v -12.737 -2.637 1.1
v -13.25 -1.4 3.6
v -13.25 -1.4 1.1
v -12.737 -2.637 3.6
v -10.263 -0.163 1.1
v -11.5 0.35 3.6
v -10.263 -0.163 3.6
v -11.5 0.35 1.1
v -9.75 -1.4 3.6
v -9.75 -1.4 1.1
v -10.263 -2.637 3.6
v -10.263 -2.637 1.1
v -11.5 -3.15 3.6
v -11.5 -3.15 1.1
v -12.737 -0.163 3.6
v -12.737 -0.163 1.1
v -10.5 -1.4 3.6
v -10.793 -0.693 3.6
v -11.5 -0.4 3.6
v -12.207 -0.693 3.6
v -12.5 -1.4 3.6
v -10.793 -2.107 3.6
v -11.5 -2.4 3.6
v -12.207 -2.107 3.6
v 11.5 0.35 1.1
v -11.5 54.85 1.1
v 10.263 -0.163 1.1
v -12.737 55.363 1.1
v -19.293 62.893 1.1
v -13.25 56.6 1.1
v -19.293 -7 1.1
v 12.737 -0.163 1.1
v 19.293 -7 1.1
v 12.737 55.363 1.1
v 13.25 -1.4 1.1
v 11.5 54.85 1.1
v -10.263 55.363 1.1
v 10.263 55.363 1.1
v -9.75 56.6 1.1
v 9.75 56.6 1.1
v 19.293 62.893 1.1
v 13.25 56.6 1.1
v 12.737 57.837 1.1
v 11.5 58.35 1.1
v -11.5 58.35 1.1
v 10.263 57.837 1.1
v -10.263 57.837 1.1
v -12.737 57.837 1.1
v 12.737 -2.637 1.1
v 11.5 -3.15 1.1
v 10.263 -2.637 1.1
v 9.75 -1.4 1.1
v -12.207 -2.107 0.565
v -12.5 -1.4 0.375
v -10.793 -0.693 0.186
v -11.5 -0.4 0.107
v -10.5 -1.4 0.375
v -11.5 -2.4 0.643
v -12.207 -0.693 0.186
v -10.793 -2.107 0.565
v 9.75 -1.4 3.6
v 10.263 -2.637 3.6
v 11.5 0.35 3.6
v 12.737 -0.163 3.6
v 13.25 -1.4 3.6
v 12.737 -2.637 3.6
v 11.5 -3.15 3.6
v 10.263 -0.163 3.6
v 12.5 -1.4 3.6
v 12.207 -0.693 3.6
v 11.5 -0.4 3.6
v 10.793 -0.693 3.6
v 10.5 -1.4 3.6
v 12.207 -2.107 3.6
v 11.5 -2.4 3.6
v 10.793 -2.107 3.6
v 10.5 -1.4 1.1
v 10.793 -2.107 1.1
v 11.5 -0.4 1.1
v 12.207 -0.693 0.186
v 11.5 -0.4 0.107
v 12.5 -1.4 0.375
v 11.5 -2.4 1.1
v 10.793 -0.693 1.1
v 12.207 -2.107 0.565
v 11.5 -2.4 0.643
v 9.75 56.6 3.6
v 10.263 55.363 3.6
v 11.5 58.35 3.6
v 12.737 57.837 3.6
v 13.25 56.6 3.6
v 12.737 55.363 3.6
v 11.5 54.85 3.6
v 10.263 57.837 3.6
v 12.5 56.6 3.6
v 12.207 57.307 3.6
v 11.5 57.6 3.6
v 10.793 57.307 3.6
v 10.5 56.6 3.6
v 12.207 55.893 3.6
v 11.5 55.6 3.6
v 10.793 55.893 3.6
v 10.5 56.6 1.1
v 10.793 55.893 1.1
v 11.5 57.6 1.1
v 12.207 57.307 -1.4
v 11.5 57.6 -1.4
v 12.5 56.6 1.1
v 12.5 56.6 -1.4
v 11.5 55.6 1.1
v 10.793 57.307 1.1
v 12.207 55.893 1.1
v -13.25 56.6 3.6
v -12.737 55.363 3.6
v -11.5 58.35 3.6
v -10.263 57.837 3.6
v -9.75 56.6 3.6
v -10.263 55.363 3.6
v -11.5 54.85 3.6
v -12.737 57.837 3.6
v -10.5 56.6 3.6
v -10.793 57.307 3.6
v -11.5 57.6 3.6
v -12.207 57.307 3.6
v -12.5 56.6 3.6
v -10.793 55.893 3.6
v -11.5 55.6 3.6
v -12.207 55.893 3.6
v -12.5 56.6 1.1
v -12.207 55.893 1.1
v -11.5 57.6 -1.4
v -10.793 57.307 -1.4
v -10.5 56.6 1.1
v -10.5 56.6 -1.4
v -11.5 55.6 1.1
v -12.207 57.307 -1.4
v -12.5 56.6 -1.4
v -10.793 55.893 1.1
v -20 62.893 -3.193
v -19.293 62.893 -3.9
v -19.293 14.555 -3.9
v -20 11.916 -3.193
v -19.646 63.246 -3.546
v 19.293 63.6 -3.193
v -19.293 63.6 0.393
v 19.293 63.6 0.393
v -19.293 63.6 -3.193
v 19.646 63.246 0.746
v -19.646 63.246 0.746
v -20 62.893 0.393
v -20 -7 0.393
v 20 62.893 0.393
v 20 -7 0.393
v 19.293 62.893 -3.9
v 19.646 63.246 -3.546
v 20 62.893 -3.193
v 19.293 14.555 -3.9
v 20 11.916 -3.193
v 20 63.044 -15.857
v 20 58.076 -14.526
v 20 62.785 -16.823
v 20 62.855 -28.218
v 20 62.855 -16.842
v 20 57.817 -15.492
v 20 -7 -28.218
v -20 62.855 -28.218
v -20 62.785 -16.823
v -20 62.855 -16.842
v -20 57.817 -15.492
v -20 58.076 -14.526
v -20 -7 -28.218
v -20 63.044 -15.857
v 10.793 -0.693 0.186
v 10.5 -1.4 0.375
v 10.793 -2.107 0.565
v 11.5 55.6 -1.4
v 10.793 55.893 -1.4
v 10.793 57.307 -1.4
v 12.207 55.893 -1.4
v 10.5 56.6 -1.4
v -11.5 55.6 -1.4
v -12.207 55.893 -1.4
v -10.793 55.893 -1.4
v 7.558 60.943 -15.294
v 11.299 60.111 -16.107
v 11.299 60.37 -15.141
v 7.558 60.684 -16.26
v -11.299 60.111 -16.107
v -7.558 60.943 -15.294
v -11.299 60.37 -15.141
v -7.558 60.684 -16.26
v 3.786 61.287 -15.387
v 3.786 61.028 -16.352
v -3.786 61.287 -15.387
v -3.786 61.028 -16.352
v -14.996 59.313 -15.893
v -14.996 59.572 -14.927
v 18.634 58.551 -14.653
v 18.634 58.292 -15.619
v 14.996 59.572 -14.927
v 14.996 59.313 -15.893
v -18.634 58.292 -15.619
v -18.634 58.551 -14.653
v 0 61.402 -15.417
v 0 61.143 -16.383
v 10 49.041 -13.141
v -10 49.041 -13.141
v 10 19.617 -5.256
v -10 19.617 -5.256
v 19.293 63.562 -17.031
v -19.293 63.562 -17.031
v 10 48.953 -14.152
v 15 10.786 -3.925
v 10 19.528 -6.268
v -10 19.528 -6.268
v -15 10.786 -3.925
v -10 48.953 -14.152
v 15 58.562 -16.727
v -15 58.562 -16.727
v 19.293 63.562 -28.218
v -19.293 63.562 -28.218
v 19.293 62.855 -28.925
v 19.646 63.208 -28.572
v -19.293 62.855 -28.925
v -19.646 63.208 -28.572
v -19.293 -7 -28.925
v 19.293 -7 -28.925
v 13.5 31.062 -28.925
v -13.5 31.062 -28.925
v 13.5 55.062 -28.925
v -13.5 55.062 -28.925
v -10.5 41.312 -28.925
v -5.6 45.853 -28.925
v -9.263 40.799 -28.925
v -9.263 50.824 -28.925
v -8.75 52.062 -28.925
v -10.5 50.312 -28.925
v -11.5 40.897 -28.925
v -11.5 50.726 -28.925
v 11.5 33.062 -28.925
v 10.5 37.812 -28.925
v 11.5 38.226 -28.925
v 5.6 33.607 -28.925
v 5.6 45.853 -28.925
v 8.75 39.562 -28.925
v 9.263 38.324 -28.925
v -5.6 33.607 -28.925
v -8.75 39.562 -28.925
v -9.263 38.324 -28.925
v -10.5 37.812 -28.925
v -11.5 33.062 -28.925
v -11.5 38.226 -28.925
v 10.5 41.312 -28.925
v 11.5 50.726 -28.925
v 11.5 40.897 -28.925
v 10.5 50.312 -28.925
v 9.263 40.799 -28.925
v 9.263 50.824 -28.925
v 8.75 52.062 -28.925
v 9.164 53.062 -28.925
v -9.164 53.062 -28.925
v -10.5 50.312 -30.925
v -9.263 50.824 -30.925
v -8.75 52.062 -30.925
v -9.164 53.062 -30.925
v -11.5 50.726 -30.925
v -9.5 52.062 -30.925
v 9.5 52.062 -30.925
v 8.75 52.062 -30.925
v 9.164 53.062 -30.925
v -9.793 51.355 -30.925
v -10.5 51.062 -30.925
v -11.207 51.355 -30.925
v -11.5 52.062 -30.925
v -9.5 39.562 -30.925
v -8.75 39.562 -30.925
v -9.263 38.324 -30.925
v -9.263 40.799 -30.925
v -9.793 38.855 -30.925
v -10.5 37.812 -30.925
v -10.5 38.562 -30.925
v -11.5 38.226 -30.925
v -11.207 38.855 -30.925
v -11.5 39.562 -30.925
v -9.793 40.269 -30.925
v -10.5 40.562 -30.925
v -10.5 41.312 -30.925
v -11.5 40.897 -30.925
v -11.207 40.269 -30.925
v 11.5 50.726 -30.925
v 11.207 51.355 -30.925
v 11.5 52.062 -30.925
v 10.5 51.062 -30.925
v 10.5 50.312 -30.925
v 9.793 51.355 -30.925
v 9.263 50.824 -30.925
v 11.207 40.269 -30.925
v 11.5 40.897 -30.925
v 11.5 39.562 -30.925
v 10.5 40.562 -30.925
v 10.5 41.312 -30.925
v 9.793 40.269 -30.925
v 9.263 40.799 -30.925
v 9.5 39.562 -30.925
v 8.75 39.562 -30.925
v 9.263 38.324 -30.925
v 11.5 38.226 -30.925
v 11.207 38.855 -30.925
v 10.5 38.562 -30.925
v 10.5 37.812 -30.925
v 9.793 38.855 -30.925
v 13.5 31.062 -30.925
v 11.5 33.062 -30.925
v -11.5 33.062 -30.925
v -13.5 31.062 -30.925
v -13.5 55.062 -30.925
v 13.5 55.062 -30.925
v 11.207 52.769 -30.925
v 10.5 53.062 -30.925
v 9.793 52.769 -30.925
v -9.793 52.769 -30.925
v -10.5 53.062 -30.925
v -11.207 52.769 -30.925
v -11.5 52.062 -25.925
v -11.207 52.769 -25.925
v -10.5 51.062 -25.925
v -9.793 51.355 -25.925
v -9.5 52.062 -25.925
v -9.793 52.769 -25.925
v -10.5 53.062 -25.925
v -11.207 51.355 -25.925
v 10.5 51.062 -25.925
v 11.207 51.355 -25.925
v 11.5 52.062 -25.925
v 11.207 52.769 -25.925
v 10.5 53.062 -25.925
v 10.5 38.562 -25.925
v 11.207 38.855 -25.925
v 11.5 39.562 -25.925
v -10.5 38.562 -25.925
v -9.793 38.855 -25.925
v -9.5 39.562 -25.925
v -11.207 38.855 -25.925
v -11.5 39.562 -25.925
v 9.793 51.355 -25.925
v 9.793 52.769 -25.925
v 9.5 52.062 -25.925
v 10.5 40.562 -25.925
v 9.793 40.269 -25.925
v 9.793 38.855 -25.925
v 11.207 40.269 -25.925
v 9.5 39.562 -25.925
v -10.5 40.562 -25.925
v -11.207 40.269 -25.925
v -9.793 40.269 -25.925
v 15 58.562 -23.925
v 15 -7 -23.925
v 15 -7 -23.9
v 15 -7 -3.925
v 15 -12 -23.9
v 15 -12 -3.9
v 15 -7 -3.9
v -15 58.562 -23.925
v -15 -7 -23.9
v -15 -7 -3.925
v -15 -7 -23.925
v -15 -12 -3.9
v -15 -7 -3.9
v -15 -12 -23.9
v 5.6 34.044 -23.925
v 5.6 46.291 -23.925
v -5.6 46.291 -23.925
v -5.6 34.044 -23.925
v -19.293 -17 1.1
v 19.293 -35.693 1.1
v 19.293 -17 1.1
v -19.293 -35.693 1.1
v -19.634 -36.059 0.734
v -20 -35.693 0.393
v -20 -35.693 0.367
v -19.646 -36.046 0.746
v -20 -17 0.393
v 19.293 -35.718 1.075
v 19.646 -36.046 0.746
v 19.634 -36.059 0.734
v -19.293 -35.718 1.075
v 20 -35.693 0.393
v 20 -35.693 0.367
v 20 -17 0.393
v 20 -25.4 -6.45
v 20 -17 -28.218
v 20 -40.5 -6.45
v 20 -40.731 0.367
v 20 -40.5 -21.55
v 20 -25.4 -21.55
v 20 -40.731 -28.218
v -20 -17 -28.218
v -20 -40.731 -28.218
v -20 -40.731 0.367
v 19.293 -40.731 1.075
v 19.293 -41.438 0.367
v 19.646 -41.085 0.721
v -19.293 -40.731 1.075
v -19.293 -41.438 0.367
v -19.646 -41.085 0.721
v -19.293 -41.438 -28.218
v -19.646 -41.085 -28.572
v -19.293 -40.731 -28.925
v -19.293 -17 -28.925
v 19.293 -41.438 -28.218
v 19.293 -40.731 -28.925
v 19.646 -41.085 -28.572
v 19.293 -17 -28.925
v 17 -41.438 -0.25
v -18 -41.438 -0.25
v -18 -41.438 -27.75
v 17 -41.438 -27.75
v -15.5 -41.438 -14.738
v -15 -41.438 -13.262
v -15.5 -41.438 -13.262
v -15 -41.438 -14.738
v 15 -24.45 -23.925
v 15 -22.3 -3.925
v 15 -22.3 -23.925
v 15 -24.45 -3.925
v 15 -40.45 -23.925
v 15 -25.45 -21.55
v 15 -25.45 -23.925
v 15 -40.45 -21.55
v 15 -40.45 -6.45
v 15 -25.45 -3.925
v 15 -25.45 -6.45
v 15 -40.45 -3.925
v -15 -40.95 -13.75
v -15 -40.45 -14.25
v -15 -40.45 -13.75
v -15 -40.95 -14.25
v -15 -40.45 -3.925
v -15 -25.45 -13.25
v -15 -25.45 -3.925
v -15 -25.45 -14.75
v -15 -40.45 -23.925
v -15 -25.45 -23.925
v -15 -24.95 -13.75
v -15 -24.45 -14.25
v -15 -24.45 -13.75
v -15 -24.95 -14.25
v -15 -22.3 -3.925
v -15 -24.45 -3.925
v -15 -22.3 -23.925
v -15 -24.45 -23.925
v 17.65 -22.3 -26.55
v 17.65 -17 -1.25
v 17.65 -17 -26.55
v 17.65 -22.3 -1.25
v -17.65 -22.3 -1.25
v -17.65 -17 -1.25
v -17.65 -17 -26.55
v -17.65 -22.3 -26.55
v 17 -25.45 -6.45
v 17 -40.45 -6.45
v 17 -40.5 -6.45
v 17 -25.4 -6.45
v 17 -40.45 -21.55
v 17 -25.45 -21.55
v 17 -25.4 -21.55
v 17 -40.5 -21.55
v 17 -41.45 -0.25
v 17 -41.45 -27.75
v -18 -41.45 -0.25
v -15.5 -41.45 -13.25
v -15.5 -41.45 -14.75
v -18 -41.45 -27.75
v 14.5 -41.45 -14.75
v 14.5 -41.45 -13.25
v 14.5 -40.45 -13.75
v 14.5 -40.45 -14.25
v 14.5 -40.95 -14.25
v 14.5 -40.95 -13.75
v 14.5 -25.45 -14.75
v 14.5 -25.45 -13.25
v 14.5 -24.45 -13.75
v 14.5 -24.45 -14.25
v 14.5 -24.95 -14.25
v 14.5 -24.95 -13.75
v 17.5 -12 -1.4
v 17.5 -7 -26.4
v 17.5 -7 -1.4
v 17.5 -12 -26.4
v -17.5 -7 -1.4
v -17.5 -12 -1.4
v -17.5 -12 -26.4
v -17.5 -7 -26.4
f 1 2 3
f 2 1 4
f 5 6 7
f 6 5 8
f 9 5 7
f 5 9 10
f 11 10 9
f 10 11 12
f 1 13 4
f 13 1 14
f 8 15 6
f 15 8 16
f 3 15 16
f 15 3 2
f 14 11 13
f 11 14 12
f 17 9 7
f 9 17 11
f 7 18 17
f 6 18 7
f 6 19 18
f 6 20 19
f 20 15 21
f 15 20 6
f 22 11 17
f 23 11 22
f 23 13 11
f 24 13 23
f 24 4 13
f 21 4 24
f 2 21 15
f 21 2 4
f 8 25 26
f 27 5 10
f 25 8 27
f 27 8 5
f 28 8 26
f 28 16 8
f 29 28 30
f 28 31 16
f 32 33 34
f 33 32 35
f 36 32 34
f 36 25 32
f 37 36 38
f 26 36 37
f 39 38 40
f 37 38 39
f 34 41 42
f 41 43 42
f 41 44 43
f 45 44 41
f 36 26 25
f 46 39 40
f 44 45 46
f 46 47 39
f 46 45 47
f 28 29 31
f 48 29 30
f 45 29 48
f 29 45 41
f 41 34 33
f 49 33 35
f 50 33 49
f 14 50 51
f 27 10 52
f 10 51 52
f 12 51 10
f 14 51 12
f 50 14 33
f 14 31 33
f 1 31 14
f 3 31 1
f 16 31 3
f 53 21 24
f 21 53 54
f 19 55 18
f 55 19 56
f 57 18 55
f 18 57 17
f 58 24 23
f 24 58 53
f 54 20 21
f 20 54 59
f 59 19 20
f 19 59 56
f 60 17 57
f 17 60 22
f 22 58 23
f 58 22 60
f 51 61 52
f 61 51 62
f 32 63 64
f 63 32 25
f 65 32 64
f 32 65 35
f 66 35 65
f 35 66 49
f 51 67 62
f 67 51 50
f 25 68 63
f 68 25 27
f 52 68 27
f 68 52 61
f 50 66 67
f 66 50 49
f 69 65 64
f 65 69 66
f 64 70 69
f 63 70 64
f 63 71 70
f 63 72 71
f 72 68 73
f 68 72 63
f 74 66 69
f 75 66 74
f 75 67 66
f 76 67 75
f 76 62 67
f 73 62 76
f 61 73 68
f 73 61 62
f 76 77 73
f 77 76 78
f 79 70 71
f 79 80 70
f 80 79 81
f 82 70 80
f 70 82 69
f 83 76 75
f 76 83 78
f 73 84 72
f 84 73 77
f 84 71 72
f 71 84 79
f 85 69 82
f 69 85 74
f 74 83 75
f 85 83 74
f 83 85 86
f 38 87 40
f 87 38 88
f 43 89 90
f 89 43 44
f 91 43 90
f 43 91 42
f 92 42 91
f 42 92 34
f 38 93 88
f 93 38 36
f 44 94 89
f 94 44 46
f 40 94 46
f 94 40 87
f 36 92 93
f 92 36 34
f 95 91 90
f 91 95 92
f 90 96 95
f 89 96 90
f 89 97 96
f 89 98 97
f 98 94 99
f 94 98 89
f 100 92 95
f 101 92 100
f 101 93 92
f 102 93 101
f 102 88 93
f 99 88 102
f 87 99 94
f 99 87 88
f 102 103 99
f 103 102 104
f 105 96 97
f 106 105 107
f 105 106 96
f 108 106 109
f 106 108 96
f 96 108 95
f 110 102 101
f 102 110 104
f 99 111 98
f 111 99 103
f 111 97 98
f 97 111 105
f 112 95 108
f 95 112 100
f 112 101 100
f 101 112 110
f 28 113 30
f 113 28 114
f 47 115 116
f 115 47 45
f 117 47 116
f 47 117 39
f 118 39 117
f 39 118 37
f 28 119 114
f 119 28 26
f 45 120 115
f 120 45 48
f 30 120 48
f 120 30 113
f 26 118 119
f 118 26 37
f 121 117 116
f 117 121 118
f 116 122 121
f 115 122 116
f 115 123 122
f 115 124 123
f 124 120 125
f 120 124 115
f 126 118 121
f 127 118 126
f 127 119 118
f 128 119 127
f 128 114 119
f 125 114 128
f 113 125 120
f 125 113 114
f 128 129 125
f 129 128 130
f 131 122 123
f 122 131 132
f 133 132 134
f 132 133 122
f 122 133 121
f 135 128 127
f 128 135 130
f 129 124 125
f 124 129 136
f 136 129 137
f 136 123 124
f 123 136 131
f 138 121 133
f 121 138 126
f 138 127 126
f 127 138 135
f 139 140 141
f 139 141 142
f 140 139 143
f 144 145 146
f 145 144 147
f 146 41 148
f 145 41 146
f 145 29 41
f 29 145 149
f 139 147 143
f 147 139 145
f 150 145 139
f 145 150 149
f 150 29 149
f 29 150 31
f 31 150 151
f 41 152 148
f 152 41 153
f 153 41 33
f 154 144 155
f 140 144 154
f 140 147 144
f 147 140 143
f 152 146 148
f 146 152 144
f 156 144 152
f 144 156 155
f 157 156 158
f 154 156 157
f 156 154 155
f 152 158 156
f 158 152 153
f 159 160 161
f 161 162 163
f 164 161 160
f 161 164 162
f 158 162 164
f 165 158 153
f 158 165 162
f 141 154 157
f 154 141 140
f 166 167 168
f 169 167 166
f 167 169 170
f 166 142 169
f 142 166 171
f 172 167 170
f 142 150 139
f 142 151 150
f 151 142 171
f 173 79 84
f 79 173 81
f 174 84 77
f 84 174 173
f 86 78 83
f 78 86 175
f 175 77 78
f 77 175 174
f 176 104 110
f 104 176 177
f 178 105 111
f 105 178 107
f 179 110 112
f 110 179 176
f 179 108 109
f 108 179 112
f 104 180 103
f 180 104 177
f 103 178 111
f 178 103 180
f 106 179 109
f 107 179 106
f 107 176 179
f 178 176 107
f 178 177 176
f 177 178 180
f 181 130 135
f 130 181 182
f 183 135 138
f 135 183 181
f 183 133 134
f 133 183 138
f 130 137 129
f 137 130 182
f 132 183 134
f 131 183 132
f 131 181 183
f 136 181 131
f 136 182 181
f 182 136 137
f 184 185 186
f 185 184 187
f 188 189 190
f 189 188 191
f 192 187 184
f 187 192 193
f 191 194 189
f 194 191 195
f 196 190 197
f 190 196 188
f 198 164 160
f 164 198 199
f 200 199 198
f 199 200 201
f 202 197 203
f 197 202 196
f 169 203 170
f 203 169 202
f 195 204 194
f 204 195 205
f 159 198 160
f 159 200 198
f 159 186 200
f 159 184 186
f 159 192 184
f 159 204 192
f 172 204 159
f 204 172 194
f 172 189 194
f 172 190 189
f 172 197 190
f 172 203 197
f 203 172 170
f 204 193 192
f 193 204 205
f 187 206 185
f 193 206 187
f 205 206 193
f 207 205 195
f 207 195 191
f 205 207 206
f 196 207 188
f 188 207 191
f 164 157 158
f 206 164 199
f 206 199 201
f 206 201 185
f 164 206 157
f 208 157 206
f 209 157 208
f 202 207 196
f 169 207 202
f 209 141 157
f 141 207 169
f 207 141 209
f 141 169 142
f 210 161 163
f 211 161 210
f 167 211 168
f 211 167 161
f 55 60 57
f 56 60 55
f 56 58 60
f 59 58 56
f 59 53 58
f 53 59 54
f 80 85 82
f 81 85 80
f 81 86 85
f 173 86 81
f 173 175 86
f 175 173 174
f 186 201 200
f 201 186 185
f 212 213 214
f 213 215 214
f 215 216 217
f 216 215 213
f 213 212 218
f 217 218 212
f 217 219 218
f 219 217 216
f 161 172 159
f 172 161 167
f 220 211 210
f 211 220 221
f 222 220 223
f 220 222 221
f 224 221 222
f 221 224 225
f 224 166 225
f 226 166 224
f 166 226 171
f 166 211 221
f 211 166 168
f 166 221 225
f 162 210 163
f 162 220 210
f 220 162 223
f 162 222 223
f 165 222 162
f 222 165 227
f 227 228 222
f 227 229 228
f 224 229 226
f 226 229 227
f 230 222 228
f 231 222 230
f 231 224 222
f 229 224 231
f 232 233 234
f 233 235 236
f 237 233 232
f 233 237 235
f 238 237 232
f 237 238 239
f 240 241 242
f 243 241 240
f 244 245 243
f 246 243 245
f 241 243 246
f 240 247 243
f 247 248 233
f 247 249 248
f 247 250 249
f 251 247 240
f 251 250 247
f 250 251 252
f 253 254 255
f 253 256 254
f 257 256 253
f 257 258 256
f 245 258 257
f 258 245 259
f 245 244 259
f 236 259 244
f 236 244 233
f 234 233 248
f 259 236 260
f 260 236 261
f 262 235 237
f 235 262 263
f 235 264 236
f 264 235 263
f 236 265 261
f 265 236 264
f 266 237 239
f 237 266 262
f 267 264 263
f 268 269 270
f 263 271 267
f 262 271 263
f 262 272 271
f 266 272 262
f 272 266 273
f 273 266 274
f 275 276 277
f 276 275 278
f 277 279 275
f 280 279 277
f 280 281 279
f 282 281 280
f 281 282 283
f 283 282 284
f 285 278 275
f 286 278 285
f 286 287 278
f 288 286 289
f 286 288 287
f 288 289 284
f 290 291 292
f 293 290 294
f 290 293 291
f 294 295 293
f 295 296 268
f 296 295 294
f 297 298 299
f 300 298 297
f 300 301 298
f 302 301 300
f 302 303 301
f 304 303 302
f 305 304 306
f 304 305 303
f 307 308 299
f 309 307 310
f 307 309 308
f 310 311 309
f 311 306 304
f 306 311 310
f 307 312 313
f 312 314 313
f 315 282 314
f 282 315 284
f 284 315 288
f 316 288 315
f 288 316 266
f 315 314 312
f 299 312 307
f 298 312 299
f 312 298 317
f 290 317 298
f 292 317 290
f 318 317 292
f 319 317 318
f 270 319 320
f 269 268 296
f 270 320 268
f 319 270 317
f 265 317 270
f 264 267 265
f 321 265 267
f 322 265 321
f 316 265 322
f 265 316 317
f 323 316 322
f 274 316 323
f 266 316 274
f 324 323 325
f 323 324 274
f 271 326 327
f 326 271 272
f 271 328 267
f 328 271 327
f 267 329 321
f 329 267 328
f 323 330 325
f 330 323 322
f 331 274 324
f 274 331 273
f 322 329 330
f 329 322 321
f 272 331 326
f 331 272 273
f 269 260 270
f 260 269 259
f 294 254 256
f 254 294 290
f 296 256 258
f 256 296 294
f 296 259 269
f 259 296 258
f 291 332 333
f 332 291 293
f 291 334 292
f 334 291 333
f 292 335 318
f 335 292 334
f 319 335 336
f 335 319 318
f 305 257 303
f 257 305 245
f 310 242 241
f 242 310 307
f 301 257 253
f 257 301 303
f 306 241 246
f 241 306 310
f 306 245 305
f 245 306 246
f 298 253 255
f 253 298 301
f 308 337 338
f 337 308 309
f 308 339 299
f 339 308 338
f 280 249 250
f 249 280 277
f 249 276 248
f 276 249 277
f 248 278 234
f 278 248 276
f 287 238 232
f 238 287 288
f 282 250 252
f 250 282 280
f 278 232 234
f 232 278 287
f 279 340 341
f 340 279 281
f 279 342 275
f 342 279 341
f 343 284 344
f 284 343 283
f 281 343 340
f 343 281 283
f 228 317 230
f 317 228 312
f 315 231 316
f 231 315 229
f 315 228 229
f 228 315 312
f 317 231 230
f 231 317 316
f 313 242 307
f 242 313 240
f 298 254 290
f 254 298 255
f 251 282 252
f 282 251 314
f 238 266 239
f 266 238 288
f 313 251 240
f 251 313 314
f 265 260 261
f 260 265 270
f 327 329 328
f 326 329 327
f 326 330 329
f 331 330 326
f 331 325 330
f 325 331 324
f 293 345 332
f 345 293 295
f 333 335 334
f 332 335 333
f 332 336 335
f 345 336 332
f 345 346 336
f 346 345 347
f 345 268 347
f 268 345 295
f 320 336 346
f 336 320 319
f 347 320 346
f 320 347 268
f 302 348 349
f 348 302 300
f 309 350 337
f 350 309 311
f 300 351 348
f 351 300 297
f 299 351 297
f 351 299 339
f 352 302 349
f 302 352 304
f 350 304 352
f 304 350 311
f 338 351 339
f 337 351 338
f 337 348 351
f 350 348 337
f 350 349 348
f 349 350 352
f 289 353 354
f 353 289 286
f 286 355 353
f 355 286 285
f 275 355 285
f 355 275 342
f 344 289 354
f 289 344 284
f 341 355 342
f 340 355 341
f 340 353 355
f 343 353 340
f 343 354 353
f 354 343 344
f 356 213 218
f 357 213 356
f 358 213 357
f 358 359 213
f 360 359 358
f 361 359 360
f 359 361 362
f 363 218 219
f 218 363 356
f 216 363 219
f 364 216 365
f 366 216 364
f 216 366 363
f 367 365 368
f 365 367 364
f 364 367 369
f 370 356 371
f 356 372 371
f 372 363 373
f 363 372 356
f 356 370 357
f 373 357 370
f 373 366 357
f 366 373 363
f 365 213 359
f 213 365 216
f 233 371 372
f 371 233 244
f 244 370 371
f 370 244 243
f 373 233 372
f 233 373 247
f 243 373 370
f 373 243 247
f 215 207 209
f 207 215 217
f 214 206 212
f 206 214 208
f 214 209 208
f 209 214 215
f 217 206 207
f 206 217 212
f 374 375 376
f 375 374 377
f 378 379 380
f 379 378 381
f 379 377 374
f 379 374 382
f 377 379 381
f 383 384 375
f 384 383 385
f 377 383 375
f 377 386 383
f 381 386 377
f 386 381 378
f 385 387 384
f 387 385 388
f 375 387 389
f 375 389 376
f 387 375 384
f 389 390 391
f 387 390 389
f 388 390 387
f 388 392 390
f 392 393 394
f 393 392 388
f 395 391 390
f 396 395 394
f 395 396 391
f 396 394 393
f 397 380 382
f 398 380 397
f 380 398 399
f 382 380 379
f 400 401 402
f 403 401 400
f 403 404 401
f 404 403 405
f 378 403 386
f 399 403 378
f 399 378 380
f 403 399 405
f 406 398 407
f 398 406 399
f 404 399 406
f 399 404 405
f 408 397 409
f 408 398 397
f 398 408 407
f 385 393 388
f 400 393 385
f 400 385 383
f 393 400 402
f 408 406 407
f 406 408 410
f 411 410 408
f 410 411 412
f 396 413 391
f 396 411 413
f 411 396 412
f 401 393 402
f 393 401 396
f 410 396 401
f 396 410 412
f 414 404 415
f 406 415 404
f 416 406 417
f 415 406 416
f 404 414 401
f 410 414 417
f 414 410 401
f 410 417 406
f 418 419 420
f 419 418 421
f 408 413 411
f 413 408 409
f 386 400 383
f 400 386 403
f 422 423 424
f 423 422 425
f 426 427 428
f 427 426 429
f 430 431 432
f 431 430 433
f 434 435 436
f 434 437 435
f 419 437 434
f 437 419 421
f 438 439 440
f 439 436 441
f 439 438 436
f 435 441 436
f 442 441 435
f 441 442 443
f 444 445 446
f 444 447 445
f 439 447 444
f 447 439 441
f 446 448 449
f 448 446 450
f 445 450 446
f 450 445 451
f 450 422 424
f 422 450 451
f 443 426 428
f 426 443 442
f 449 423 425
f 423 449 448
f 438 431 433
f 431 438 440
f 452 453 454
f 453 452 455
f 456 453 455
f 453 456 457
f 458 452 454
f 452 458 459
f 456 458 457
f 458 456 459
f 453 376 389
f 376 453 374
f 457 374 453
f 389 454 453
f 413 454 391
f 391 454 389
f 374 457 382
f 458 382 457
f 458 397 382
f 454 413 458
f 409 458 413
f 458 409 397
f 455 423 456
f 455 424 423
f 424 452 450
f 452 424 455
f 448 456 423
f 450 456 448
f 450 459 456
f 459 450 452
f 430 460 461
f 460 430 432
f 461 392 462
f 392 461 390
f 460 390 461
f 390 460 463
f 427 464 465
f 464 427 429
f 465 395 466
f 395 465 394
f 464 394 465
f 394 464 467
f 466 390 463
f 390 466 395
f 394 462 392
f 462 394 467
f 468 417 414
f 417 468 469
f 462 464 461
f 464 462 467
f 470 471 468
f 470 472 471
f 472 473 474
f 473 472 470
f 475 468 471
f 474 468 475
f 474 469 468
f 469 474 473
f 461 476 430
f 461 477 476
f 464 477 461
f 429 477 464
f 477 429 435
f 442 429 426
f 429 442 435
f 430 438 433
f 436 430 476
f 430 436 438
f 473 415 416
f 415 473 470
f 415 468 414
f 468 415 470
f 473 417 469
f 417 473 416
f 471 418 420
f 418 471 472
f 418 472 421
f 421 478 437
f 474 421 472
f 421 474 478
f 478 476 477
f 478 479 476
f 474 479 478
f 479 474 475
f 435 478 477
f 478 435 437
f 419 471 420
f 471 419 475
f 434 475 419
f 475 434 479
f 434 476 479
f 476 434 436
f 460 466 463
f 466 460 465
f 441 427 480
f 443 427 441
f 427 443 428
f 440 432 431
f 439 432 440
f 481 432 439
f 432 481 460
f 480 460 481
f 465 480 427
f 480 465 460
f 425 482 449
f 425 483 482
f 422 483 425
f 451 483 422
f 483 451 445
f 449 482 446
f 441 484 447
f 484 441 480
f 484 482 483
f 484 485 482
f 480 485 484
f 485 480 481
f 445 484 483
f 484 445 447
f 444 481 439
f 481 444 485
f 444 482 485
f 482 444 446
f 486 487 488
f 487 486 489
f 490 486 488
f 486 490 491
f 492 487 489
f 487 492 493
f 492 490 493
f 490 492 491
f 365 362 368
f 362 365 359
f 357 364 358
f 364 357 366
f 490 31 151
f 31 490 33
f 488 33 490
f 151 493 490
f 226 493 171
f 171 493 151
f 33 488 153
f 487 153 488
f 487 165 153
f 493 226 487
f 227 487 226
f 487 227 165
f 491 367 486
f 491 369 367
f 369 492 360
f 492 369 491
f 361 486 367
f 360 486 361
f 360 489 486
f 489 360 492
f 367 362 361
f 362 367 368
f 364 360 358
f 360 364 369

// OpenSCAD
// file: chamfer.scad
module chamfered_cube(size, chamfer, center = false) {
    center_offset = center ? [
        -size[0]/2,
        -size[1]/2,
        -size[2]/2
    ] : [0,0,0];
    
    translate(center_offset)
    
    difference() {
        cube(size);
        
        chamfer_cross(size, chamfer);
        
        translate([0,size[1],size[2]])
        chamfer_cross(size, chamfer);
        
        translate([size[0],0,size[2]])
        chamfer_cross(size, chamfer);
        
        translate([size[0],size[1], 0])
        chamfer_cross(size, chamfer);
    }
}

module chamfer_cross(size, chamfer){
    for(z=[0:3]) for(y=[0:3])
            rotate([0,90*y,90*z])
            translate([max(size)/2,0,0])
            rotate([45,0,0])
            cube([max(size),chamfer,chamfer], true);
}

chamfered_cube([10,20,30], 2, true);
// main file
use <chamfer.scad>;


//for(i=[0: 4])
//    translate([i*40,0,0])

//slit(0.5+i*0.1);

angle = 15;
diffraction_angle = 90-angle;
tall = 95;
wall = 5;
width = 30;
height = 20;

window_size = 11.2;

//slit_side();

//grating_holder();

$fn=8;


translate([0,-10,0]){
difference(){
    
rotate([-angle,0,0])
spec_zero();
    
translate([-50, -7, -50])
cube([100,100,100]);

translate([-width/2-wall,0,-wall*1.5-1.4-height])
difference(){
    translate([wall/2-0.15,-12-0.3, wall/2-0.15])
        cube([width+wall+0.3,5+0.3,height +wall+0.3]);
    translate([wall, -12-0.3, wall])
        cube([width, 5+0.3, height-0.1]);
}


translate([0,-30.5,-wall-height/2+1-15.1/2])
cube([100, 15.1, 15.1]);
}

translate([-18,-30.45,-14])
rotate([90,0,0])
slit(offset=0.5);

translate([-18,-30.45+16,-14])
rotate([90,0,0])
slit(offset=0.5);

}



translate([-width/2-wall,0,-wall*1.5-1.4-height])
difference(){
    translate([ wall/2,-12, wall/2])
        cube([width+wall,5,height +wall]);
    translate([wall, -12, wall])
        cube([width, 5, height]);
}

intersection(){
translate([-50, -7, -50])
cube([100,100,100]);

rotate([-angle,0,0])
spec_zero();
}

module spec_zero(){
    rotate([angle,0,0])
    translate([-11.5,-1.4,1.1])
    union(){
        pi_zero_standoffs();
        difference(){
            translate([(-width-wall*2+23)/2,-25,-wall])
            chamfered_cube([width+wall*2,tall-5,wall],1);
        
            #pi_zero_standoffs_offsets()
            translate([0,0,-2.5])
            cylinder(5, 2/2, 2/2);
            
            
        }
    }
    
                
                
    intersection(){
        //translate([-40,20,-100])cube([100,35,89]);
    difference(){
        refle_spec();
        
        rotate([10,0,0])
        translate([-window_size/2,36,-100])
        cube([window_size,window_size+1,100]);
        
        rotate([10,0,0])
        translate([-10,20,-10])
        cube([20,30,10]);
        
        // Pixel Fold bump
        // rotate([10,0,0])
        // translate([-30,34,-21])
        // cube([100, 22, 3]);
        
        
    }
    }
}


module m2_stand(height=2.5){
    
    difference(){
        cylinder(height, 3.5/2, 3.5/2);
        cylinder(height+1, 2/2, 2/2);
    }    
}

module pi_camera_standoff_offsets(){
        children();
        translate([21,0,0]) children();
        translate([21,12.5,0]) children();
        translate([0,12.5,0]) children();
}

module pi_camera_standoffs(){
    pi_camera_standoff_offsets()
    m2_stand(2);
    
    difference(){
        translate([-3,-3,0]) cube([27,24,2]);
        translate([-1,-1,-1]) cube([23,20,3]);
    }
}

module pi_zero_standoffs_offsets(){
        children();
        translate([23,0,0]) children();
        translate([23,65-7,0]) children();
        translate([0,65-7,0]) children();
}

module pi_zero_standoffs(){
        pi_zero_standoffs_offsets()
        m2_stand(); 
}


module dvd() {
    difference() {
        cylinder(1, 120/2+0.3, 120/2+0.3, $fn=100);
        cylinder(2, 15/2-0.3, 15/2-0.3, $fn=40);
        
    }
}

module grating_holder() {
    
    difference(){
        translate([-width/2-wall,0,-1])
        cube([width+wall*2, 65, 2]);
        
        translate([0,3,0])
        #dvd();
    }
}


module slit_side(offset=0){
    difference(){
        
        slice_height = height+wall*1.5;
    
        translate([0,-slice_height/2,0])
        cube([width+wall, slice_height, 1]);
        
        translate([wall/2,-offset,0.5])
        rotate([45,0,0]) 
        cube([width, 20, 20]);
        
        translate([wall/2,-offset,-1])
        cube([width, 20, 20]);
        
        
    }
}

module slit(offset=0){
    slit_side(offset/2);
    mirror([0,1,0]) slit_side(offset/2);
}

module refle_spec(){
    grating_holder();
    
    difference(){
    translate([0,65,3])
    rotate([-diffraction_angle,0,0])
    translate([-width/2-wall,-height/2-wall,-tall])
    difference(){
        
        union(){
            chamfered_cube([width+wall*2, height+wall*2, tall], 1);
            
            rotate([90,0,0])
            translate([wall+(width-21)/2,tall-11.5,-height-wall*2-2])
            mirror([0,1,0])
            pi_camera_standoffs();
        }
        
        // screw holes
        #rotate([90,0,0])
        translate([wall+(width-21)/2,tall-11.5,-height-wall*2-2])
        mirror([0,1,0])
        pi_camera_standoff_offsets()
        cylinder(5, 2/2, 2/2);
        
        
        
        
        // Light path
        translate([wall, wall, -wall])
        cube([width, height, tall]);
        
        
    }
    translate([-50,-50,0])
    cube([200,200,100]);
    }
}

module spec(){
    difference(){
            translate([0,0,tall])
            rotate([-diffraction_angle,0,0])
            translate([width/2+wall,65+0.5,1])
            mirror([0,1,0])
            grating_holder();
        
        #translate([wall, wall, -1])
        cube([width, height, tall+10]);
        
    }


    difference(){
        
        chamfered_cube([width+wall*2, height+wall*2, tall], 1);

        
        #translate([wall, wall, -1])
        cube([width, height, tall+10]);
        
        translate([0,0,tall])
        rotate([-diffraction_angle,0,0])
        cube([100, 100, 100]);
        
        
        
        #translate([wall/2-0.5, wall/2-0.5, 2])
        cube([width+wall+1, 60+1, 1+0.6]);
        
    }
}
